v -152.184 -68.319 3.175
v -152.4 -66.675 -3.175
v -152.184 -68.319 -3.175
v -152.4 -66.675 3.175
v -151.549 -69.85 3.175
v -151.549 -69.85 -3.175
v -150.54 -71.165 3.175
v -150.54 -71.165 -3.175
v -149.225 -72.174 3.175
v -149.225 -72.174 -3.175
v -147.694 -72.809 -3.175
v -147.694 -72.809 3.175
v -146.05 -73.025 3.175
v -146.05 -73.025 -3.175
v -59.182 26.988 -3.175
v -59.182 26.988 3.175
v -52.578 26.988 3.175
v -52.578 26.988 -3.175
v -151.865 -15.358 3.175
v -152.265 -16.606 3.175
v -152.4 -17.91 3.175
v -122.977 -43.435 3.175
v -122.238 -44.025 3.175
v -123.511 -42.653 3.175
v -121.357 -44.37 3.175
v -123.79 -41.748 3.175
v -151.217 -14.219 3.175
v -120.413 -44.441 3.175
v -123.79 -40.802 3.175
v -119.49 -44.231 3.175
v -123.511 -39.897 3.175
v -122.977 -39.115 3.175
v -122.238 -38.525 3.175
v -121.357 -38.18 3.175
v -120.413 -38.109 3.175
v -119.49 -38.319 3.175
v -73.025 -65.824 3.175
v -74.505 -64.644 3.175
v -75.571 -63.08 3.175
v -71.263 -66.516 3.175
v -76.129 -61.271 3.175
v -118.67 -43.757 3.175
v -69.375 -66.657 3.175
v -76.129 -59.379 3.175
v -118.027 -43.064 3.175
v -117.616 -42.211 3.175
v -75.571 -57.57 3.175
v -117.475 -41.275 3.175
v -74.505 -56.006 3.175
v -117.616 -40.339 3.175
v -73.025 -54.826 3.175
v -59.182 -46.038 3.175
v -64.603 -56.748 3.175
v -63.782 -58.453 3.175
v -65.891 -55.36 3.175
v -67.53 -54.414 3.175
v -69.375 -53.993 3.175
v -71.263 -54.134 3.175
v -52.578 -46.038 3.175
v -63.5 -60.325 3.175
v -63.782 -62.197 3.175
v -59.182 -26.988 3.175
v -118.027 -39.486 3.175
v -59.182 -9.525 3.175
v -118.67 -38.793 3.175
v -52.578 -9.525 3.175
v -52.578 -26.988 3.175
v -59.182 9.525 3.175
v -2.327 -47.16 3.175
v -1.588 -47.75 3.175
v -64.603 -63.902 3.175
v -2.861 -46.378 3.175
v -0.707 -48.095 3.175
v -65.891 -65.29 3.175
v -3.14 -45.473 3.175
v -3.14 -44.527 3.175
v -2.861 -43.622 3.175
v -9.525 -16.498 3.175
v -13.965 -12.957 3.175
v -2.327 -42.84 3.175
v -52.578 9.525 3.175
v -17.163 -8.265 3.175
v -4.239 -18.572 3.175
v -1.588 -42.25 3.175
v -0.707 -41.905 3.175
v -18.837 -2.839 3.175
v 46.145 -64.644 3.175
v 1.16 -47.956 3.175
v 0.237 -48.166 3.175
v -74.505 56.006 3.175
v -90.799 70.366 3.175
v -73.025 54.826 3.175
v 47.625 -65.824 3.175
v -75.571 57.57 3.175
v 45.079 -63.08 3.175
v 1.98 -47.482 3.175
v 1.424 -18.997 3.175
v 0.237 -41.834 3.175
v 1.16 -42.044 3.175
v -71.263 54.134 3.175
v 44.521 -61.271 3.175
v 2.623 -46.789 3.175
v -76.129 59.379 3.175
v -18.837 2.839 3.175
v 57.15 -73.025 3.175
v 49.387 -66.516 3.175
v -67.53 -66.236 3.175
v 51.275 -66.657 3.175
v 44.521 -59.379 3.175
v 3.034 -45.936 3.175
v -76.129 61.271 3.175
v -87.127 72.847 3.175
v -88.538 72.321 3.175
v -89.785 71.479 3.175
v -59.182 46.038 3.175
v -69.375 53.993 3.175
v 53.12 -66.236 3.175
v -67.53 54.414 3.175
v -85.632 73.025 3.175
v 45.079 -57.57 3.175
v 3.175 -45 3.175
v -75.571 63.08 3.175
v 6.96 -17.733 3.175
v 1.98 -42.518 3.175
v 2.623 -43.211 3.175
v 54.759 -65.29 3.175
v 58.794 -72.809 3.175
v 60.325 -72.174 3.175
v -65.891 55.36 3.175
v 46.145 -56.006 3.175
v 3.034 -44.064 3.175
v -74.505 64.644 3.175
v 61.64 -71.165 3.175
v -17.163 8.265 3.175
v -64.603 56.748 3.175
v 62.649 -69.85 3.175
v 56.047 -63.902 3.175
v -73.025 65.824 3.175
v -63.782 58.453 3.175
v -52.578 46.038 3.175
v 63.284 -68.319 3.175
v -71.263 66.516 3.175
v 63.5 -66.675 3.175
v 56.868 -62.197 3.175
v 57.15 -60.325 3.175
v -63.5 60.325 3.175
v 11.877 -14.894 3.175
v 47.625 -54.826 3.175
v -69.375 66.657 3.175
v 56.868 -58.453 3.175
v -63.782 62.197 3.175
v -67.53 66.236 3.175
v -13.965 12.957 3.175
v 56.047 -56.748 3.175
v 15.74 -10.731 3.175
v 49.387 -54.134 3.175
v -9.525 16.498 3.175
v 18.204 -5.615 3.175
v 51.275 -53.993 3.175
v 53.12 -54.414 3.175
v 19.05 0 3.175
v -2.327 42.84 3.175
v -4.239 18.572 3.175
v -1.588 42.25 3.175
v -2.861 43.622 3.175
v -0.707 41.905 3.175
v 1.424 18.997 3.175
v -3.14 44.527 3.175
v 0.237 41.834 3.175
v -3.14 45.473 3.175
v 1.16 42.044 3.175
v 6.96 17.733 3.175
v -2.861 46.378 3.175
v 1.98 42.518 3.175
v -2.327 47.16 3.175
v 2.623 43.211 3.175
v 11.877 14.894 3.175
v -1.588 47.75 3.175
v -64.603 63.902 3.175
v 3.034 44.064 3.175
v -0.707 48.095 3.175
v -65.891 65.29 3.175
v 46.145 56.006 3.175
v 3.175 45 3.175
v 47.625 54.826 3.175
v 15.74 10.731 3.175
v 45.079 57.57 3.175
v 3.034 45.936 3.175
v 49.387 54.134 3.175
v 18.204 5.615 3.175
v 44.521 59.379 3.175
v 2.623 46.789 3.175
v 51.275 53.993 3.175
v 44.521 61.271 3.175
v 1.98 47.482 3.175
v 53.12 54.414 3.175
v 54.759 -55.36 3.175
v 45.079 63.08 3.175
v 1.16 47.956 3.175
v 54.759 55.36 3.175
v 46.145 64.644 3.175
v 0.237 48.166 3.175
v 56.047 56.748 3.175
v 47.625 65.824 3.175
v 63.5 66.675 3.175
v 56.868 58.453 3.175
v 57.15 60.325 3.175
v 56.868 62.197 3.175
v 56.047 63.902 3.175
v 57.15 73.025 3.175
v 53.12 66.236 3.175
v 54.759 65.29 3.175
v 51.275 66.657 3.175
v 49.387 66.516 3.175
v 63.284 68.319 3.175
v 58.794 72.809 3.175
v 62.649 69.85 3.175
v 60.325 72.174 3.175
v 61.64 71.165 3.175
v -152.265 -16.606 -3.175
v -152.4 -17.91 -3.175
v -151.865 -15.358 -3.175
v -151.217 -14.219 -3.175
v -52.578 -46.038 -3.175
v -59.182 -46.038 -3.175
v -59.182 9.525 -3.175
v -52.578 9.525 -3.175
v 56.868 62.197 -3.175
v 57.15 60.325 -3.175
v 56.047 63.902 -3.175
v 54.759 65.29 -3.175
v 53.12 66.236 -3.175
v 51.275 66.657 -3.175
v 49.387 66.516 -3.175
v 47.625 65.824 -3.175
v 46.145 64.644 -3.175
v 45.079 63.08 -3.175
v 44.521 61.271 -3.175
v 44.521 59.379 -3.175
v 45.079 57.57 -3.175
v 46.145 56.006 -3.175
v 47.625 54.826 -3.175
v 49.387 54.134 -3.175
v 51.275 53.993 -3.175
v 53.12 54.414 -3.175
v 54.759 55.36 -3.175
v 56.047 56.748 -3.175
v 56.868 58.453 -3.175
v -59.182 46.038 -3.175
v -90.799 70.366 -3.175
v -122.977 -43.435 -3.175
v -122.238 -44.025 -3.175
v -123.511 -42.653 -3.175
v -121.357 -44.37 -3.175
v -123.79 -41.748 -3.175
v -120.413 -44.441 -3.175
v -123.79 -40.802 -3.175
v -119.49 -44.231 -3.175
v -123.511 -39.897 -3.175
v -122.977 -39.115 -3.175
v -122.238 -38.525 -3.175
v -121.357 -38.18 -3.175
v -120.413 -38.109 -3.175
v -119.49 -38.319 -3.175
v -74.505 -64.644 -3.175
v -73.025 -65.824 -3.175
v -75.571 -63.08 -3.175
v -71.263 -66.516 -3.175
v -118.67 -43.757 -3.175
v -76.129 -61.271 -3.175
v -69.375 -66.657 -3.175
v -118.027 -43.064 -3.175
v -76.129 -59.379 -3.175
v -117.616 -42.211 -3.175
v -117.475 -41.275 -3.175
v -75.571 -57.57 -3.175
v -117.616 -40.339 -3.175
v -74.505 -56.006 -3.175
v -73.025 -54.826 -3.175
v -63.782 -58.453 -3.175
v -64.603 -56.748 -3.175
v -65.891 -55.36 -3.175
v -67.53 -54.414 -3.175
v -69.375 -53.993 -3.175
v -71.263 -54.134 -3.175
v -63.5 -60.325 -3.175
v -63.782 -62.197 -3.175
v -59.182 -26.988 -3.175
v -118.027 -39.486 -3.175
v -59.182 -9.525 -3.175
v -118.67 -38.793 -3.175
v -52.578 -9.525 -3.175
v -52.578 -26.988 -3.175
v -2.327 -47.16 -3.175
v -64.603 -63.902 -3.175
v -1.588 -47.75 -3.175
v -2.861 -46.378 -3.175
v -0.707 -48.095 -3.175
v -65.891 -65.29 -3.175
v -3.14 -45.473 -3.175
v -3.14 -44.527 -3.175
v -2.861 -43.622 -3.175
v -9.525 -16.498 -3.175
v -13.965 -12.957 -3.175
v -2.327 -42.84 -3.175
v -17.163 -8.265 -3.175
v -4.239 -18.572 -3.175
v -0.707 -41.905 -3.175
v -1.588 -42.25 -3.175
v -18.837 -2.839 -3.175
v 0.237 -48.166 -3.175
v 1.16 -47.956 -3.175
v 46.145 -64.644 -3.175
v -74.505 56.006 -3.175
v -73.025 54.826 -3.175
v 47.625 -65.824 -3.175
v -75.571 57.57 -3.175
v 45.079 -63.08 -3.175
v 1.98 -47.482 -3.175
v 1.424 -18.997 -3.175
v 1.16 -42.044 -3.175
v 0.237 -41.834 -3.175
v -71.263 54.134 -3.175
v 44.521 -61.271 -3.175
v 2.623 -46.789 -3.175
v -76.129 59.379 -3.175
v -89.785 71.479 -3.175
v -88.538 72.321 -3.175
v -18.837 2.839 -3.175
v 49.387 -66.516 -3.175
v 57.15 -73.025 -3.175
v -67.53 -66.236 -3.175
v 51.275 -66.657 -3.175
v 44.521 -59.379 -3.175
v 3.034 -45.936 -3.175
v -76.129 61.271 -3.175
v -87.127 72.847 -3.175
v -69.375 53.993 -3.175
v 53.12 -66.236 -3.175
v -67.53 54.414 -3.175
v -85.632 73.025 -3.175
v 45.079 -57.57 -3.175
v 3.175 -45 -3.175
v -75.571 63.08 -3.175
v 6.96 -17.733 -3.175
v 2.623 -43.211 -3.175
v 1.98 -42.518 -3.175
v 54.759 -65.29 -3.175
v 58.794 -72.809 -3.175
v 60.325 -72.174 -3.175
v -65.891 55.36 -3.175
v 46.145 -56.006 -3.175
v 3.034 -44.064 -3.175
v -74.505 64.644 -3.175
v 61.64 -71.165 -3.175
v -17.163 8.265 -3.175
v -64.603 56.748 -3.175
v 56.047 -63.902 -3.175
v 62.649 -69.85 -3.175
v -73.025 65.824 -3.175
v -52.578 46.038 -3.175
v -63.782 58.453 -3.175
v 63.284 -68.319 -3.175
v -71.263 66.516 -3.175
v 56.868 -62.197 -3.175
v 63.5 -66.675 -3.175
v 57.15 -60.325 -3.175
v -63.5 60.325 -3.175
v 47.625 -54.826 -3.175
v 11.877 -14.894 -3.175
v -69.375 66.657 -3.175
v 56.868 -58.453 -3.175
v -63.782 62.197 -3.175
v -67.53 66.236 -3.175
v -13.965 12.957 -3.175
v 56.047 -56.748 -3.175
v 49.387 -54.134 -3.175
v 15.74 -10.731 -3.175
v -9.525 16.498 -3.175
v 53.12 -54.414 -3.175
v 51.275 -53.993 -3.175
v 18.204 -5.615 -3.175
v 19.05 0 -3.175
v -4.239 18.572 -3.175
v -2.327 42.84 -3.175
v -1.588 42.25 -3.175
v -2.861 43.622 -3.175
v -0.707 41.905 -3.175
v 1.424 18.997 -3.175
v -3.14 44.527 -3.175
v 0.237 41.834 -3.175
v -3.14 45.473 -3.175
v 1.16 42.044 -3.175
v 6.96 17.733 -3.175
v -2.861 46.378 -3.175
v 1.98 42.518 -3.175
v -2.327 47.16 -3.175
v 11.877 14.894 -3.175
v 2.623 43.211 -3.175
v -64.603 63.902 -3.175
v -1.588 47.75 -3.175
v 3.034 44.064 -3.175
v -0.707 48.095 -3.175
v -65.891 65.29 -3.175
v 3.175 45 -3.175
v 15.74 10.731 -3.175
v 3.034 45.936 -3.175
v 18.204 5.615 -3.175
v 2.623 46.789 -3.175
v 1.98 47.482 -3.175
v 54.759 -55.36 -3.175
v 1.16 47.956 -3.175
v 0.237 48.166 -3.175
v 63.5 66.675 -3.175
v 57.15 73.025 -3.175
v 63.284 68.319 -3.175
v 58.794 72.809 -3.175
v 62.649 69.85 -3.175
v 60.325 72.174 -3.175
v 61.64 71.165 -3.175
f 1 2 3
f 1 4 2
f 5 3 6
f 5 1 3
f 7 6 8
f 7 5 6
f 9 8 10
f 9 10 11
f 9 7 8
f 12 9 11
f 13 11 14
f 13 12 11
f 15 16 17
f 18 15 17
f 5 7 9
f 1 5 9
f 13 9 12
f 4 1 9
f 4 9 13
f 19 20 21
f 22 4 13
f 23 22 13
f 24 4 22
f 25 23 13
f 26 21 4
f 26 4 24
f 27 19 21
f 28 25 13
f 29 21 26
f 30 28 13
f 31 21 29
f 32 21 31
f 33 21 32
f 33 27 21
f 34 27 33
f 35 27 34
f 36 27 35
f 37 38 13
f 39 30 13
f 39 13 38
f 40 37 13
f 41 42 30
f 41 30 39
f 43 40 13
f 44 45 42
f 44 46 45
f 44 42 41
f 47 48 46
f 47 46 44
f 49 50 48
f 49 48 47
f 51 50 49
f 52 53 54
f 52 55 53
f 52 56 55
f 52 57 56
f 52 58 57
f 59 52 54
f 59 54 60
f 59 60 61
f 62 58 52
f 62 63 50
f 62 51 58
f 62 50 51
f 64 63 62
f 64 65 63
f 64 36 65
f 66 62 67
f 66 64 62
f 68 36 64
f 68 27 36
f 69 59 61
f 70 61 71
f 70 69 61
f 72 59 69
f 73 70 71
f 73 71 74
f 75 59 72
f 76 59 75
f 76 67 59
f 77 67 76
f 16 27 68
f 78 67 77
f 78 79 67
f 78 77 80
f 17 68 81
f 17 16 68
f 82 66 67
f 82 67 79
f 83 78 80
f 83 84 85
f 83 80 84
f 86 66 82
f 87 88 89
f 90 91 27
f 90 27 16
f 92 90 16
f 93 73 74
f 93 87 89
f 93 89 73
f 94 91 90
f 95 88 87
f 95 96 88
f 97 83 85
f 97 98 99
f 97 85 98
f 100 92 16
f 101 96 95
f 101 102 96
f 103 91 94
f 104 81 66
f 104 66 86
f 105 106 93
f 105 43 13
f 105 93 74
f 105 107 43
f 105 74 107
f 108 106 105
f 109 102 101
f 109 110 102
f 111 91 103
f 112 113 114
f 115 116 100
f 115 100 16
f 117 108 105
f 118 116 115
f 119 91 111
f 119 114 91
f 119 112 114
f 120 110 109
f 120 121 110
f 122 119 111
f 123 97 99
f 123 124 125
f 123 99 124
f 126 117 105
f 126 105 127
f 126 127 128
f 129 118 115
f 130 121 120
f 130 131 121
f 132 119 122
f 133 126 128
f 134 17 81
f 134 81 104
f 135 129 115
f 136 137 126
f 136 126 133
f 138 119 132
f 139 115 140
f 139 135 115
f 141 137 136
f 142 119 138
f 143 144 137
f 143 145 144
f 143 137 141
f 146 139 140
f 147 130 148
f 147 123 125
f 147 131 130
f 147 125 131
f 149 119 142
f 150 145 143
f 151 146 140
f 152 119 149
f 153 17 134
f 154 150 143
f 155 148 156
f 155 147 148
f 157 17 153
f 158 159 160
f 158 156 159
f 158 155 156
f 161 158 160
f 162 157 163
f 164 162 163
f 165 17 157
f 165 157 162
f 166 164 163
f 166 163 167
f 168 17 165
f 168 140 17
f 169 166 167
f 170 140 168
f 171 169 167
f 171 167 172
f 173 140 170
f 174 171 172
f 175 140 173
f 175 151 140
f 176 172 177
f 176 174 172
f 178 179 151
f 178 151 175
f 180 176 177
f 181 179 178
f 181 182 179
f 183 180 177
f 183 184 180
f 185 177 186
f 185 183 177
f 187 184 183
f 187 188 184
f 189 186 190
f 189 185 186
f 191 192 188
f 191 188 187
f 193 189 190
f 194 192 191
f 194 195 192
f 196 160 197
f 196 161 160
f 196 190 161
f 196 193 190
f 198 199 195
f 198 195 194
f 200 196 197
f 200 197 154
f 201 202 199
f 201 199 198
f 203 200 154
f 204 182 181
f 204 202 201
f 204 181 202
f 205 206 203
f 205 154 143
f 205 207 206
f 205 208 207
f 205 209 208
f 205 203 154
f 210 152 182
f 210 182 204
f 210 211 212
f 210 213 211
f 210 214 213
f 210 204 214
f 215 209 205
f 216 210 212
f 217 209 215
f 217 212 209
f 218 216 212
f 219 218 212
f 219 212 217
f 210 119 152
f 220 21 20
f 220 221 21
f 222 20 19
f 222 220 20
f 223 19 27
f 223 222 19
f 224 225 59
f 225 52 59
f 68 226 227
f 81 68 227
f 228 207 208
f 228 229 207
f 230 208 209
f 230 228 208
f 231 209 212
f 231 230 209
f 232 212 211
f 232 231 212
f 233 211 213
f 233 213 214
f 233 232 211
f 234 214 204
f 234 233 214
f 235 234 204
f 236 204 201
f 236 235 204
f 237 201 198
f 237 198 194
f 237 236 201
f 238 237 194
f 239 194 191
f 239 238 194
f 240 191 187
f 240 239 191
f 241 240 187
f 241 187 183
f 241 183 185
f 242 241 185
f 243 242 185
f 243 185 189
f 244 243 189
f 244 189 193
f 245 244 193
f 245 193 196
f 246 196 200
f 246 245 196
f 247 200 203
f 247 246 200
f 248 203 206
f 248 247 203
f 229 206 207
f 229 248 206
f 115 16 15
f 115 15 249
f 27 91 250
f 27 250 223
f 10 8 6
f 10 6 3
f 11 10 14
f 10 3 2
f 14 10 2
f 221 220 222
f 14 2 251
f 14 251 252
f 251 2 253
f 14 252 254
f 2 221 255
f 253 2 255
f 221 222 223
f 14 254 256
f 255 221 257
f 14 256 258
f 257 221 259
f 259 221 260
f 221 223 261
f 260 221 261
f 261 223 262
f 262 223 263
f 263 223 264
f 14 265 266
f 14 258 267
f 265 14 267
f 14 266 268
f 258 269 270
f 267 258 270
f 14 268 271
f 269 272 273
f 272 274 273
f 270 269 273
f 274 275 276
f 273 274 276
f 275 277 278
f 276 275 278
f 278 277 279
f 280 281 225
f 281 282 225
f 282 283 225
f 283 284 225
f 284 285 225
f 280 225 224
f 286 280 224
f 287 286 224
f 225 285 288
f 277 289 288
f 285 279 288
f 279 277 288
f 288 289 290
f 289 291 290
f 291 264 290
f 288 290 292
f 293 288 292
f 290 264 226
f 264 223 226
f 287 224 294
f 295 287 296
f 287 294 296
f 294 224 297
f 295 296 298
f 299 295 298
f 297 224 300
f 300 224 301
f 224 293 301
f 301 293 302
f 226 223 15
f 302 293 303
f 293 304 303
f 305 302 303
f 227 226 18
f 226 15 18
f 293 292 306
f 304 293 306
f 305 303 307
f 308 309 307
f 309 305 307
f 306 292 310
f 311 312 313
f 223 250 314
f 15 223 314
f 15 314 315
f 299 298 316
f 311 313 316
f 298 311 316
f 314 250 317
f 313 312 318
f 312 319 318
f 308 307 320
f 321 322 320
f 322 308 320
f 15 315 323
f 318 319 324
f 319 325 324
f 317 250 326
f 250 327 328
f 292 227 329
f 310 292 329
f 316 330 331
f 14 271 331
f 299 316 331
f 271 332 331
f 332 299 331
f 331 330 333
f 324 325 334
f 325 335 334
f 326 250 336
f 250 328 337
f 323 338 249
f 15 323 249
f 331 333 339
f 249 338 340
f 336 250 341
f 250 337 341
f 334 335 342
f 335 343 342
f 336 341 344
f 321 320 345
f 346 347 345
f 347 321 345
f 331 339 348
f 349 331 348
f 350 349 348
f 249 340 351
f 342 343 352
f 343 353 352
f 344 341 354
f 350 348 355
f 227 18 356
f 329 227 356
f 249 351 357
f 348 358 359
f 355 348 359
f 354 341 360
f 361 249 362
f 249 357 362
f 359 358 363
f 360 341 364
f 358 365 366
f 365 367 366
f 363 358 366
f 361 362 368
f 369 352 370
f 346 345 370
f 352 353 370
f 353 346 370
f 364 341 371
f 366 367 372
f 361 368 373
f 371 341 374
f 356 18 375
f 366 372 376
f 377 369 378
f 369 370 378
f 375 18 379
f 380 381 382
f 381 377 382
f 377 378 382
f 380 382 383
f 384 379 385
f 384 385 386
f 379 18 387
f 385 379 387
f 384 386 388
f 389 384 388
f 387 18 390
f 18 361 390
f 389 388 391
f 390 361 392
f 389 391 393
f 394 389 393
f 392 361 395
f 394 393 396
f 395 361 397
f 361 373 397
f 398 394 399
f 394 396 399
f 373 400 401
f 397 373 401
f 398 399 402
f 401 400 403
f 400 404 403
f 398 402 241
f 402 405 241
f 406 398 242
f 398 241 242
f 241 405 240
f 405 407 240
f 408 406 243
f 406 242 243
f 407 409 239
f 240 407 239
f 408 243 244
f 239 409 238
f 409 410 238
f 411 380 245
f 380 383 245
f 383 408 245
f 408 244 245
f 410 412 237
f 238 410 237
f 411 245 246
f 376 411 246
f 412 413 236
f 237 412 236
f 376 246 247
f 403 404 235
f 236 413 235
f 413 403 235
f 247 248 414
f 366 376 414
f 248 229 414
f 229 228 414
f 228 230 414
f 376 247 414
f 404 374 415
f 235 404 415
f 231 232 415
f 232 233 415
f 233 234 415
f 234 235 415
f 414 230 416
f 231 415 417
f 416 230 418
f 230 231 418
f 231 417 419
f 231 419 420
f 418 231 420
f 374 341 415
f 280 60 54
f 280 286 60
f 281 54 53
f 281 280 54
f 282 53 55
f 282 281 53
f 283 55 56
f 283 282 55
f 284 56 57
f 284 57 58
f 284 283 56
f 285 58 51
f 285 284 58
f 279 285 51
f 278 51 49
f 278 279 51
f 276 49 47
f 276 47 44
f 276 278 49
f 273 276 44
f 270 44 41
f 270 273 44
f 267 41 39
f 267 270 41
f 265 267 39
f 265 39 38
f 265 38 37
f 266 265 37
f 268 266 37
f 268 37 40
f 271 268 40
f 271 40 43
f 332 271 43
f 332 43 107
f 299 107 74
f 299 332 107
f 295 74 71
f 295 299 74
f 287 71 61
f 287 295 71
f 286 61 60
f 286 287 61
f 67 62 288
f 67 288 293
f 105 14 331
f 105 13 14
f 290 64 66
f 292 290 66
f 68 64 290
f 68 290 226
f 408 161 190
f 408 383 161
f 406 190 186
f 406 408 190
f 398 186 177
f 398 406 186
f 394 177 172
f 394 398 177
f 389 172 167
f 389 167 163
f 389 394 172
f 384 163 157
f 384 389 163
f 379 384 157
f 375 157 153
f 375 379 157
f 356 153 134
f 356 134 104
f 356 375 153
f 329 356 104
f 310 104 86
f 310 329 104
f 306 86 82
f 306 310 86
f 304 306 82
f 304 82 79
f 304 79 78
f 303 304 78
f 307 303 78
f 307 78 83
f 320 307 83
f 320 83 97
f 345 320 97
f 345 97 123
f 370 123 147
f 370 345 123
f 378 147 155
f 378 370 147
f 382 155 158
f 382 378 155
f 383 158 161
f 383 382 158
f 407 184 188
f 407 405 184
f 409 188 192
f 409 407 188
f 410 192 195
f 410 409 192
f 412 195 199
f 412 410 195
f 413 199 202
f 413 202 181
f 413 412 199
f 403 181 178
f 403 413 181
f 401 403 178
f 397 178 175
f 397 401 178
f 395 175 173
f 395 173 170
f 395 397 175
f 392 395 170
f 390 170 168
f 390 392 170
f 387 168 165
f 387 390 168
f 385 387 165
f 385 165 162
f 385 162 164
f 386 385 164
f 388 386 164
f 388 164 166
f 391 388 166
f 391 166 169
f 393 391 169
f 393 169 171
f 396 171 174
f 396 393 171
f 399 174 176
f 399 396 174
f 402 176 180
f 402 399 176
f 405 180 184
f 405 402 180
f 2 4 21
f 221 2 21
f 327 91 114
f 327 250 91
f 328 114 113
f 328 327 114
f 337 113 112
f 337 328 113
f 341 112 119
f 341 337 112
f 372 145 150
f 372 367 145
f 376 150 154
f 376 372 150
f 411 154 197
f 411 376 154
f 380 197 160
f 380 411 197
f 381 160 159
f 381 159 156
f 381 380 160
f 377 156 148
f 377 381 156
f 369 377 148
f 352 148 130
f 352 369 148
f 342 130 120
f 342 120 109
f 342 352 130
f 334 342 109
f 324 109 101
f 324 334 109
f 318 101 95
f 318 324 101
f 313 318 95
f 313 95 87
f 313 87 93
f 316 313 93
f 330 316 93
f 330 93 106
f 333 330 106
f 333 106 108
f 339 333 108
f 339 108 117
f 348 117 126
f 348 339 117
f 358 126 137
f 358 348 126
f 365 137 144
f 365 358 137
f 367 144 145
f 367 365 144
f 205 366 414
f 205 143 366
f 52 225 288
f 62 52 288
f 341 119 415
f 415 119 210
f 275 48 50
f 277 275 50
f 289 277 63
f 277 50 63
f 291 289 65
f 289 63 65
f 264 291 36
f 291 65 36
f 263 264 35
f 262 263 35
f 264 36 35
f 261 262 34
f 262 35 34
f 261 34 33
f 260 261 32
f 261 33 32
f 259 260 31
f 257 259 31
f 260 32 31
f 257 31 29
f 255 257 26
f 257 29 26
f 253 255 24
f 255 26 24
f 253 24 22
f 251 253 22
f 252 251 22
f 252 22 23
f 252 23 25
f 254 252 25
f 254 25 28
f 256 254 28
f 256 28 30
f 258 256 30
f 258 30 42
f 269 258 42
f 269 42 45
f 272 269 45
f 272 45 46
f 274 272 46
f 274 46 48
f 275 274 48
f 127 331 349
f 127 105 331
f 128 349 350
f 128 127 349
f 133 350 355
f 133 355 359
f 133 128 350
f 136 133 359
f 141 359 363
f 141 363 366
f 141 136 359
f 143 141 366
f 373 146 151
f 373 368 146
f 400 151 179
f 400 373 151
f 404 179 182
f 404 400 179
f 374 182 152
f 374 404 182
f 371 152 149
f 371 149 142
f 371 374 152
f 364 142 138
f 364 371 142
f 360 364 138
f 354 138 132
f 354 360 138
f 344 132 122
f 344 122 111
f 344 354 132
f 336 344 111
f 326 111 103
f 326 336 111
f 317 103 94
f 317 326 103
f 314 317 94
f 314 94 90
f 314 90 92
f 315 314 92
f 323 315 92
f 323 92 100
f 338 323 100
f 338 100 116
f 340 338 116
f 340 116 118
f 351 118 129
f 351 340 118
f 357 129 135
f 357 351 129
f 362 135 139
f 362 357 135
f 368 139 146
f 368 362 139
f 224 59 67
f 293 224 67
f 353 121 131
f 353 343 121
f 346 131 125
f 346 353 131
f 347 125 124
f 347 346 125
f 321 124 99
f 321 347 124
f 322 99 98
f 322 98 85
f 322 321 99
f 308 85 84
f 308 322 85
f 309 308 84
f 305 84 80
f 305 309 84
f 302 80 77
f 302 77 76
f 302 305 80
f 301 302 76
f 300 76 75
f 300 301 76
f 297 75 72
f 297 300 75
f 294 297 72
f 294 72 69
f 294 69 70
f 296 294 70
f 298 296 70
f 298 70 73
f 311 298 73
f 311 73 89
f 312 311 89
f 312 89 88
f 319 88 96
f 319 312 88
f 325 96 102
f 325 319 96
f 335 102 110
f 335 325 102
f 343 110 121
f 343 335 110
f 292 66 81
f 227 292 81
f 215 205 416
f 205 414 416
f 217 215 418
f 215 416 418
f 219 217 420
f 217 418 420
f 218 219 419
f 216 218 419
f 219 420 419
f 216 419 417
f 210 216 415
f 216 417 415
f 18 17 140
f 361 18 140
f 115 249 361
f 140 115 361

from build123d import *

# Parameters (mm, degrees)
SKETCH1_W           = 215.9
SKETCH1_H           = 146.05
SKETCH1_R           = 6.35
SKETCH1_R_2         = 19.05
SKETCH1_R_3         = 3.175
SKETCH1_W_2         = 6.604
SKETCH1_H_2         = 19.05
BOSS_EXTRUDE1_DEPTH = 3.175
SKETCH2_R           = 3.175
CUT_EXTRUDE1_DEPTH  = 7.35
FILLET1_R           = 6.35


with BuildPart() as part:
    # Sketch1 → Boss-Extrude1 (new body, symmetric)
    with BuildSketch(Plane.XY):
        with Locations((-44.45, 0)):
            Rectangle(SKETCH1_W, SKETCH1_H)
        with Locations((50.8, 60.325)):
            Circle(SKETCH1_R, mode=Mode.SUBTRACT)
        with Locations((50.8, -60.325)):
            Circle(SKETCH1_R, mode=Mode.SUBTRACT)
        Circle(SKETCH1_R_2, mode=Mode.SUBTRACT)
        with Locations((0, 45)):
            Circle(SKETCH1_R_3, mode=Mode.SUBTRACT)
        with Locations((0, -45)):
            Circle(SKETCH1_R_3, mode=Mode.SUBTRACT)
        with Locations((-69.85, 60.325)):
            Circle(SKETCH1_R, mode=Mode.SUBTRACT)
        with Locations((-69.85, -60.325)):
            Circle(SKETCH1_R, mode=Mode.SUBTRACT)
        with Locations((-55.88, 0)):
            Rectangle(SKETCH1_W_2, SKETCH1_H_2, mode=Mode.SUBTRACT)
        with Locations((-55.88, 36.5125)):
            Rectangle(SKETCH1_W_2, SKETCH1_H_2, mode=Mode.SUBTRACT)
        with Locations((-55.88, -36.5125)):
            Rectangle(SKETCH1_W_2, SKETCH1_H_2, mode=Mode.SUBTRACT)
    extrude(amount=BOSS_EXTRUDE1_DEPTH, both=True)

    # Sketch2 → Cut-Extrude1 (cut, through all)
    with BuildSketch(Plane.XY.offset(3.175)):
        with Locations((-120.65, -41.275)):
            Circle(SKETCH2_R)
        Polygon((-88.9, 73.025), (-152.4, -15.875), (-152.4, 73.025), align=None)
    extrude(amount=-CUT_EXTRUDE1_DEPTH, mode=Mode.SUBTRACT)

    # Fillet1
    fillet1_edges = [part.edges().sort_by_distance(p)[0] for p in [
        (63.5, 73.025, 0),
        (63.5, -73.025, 0),
        (-152.4, -73.025, 0),
        (-88.9, 73.025, 0),
        (-152.4, -15.875, 0),
    ]]
    fillet(fillet1_edges, radius=FILLET1_R)


solid = part.part
